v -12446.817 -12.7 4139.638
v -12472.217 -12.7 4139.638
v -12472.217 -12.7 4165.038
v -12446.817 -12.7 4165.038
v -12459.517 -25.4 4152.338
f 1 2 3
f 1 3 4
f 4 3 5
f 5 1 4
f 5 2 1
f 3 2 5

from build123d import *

# Parameters (mm, degrees)
F0_W     = 25.4
F0_H     = 25.4
F1_DEPTH = 25.4
F2_SIZE  = 12.69999
F3_W     = 25.4
F3_H     = 12.7
F4_DEPTH = 25.4


# Not quite as in the source:
# - a fillet or chamfer is up to 0.001 mm smaller than in the source, because OpenCascade refuses the exact size


with BuildPart() as f1:
    # F0 (on Front) → F1 (new body)
    with BuildSketch(Plane.XZ):
        with Locations((-12459.5173980713, 4152.3379470825)):
            Rectangle(F0_W, F0_H)
    extrude(amount=F1_DEPTH)

    # F2 (size 12.7 in the source; OpenCascade refuses exactly that, so slightly less here)
    f2_edges = [f1.edges().sort_by_distance(p)[0] for p in [
        (-12446.817398, -25.4, 4152.337947),
        (-12459.517398, -25.4, 4139.637947),
        (-12472.217398, -25.4, 4152.337947),
        (-12459.517398, -25.4, 4165.037947),
    ]]
    chamfer(f2_edges, length=F2_SIZE)

    # F3 (on face) → F4 (cut)
    with BuildSketch(Plane(origin=(0, 0, 4139.6379470825), x_dir=(1, 0, 0), z_dir=(0, 0, -1))):
        with Locations((-12459.5173980713, 6.35)):
            Rectangle(F3_W, F3_H)
    extrude(amount=-F4_DEPTH, mode=Mode.SUBTRACT)


solid = f1.part
